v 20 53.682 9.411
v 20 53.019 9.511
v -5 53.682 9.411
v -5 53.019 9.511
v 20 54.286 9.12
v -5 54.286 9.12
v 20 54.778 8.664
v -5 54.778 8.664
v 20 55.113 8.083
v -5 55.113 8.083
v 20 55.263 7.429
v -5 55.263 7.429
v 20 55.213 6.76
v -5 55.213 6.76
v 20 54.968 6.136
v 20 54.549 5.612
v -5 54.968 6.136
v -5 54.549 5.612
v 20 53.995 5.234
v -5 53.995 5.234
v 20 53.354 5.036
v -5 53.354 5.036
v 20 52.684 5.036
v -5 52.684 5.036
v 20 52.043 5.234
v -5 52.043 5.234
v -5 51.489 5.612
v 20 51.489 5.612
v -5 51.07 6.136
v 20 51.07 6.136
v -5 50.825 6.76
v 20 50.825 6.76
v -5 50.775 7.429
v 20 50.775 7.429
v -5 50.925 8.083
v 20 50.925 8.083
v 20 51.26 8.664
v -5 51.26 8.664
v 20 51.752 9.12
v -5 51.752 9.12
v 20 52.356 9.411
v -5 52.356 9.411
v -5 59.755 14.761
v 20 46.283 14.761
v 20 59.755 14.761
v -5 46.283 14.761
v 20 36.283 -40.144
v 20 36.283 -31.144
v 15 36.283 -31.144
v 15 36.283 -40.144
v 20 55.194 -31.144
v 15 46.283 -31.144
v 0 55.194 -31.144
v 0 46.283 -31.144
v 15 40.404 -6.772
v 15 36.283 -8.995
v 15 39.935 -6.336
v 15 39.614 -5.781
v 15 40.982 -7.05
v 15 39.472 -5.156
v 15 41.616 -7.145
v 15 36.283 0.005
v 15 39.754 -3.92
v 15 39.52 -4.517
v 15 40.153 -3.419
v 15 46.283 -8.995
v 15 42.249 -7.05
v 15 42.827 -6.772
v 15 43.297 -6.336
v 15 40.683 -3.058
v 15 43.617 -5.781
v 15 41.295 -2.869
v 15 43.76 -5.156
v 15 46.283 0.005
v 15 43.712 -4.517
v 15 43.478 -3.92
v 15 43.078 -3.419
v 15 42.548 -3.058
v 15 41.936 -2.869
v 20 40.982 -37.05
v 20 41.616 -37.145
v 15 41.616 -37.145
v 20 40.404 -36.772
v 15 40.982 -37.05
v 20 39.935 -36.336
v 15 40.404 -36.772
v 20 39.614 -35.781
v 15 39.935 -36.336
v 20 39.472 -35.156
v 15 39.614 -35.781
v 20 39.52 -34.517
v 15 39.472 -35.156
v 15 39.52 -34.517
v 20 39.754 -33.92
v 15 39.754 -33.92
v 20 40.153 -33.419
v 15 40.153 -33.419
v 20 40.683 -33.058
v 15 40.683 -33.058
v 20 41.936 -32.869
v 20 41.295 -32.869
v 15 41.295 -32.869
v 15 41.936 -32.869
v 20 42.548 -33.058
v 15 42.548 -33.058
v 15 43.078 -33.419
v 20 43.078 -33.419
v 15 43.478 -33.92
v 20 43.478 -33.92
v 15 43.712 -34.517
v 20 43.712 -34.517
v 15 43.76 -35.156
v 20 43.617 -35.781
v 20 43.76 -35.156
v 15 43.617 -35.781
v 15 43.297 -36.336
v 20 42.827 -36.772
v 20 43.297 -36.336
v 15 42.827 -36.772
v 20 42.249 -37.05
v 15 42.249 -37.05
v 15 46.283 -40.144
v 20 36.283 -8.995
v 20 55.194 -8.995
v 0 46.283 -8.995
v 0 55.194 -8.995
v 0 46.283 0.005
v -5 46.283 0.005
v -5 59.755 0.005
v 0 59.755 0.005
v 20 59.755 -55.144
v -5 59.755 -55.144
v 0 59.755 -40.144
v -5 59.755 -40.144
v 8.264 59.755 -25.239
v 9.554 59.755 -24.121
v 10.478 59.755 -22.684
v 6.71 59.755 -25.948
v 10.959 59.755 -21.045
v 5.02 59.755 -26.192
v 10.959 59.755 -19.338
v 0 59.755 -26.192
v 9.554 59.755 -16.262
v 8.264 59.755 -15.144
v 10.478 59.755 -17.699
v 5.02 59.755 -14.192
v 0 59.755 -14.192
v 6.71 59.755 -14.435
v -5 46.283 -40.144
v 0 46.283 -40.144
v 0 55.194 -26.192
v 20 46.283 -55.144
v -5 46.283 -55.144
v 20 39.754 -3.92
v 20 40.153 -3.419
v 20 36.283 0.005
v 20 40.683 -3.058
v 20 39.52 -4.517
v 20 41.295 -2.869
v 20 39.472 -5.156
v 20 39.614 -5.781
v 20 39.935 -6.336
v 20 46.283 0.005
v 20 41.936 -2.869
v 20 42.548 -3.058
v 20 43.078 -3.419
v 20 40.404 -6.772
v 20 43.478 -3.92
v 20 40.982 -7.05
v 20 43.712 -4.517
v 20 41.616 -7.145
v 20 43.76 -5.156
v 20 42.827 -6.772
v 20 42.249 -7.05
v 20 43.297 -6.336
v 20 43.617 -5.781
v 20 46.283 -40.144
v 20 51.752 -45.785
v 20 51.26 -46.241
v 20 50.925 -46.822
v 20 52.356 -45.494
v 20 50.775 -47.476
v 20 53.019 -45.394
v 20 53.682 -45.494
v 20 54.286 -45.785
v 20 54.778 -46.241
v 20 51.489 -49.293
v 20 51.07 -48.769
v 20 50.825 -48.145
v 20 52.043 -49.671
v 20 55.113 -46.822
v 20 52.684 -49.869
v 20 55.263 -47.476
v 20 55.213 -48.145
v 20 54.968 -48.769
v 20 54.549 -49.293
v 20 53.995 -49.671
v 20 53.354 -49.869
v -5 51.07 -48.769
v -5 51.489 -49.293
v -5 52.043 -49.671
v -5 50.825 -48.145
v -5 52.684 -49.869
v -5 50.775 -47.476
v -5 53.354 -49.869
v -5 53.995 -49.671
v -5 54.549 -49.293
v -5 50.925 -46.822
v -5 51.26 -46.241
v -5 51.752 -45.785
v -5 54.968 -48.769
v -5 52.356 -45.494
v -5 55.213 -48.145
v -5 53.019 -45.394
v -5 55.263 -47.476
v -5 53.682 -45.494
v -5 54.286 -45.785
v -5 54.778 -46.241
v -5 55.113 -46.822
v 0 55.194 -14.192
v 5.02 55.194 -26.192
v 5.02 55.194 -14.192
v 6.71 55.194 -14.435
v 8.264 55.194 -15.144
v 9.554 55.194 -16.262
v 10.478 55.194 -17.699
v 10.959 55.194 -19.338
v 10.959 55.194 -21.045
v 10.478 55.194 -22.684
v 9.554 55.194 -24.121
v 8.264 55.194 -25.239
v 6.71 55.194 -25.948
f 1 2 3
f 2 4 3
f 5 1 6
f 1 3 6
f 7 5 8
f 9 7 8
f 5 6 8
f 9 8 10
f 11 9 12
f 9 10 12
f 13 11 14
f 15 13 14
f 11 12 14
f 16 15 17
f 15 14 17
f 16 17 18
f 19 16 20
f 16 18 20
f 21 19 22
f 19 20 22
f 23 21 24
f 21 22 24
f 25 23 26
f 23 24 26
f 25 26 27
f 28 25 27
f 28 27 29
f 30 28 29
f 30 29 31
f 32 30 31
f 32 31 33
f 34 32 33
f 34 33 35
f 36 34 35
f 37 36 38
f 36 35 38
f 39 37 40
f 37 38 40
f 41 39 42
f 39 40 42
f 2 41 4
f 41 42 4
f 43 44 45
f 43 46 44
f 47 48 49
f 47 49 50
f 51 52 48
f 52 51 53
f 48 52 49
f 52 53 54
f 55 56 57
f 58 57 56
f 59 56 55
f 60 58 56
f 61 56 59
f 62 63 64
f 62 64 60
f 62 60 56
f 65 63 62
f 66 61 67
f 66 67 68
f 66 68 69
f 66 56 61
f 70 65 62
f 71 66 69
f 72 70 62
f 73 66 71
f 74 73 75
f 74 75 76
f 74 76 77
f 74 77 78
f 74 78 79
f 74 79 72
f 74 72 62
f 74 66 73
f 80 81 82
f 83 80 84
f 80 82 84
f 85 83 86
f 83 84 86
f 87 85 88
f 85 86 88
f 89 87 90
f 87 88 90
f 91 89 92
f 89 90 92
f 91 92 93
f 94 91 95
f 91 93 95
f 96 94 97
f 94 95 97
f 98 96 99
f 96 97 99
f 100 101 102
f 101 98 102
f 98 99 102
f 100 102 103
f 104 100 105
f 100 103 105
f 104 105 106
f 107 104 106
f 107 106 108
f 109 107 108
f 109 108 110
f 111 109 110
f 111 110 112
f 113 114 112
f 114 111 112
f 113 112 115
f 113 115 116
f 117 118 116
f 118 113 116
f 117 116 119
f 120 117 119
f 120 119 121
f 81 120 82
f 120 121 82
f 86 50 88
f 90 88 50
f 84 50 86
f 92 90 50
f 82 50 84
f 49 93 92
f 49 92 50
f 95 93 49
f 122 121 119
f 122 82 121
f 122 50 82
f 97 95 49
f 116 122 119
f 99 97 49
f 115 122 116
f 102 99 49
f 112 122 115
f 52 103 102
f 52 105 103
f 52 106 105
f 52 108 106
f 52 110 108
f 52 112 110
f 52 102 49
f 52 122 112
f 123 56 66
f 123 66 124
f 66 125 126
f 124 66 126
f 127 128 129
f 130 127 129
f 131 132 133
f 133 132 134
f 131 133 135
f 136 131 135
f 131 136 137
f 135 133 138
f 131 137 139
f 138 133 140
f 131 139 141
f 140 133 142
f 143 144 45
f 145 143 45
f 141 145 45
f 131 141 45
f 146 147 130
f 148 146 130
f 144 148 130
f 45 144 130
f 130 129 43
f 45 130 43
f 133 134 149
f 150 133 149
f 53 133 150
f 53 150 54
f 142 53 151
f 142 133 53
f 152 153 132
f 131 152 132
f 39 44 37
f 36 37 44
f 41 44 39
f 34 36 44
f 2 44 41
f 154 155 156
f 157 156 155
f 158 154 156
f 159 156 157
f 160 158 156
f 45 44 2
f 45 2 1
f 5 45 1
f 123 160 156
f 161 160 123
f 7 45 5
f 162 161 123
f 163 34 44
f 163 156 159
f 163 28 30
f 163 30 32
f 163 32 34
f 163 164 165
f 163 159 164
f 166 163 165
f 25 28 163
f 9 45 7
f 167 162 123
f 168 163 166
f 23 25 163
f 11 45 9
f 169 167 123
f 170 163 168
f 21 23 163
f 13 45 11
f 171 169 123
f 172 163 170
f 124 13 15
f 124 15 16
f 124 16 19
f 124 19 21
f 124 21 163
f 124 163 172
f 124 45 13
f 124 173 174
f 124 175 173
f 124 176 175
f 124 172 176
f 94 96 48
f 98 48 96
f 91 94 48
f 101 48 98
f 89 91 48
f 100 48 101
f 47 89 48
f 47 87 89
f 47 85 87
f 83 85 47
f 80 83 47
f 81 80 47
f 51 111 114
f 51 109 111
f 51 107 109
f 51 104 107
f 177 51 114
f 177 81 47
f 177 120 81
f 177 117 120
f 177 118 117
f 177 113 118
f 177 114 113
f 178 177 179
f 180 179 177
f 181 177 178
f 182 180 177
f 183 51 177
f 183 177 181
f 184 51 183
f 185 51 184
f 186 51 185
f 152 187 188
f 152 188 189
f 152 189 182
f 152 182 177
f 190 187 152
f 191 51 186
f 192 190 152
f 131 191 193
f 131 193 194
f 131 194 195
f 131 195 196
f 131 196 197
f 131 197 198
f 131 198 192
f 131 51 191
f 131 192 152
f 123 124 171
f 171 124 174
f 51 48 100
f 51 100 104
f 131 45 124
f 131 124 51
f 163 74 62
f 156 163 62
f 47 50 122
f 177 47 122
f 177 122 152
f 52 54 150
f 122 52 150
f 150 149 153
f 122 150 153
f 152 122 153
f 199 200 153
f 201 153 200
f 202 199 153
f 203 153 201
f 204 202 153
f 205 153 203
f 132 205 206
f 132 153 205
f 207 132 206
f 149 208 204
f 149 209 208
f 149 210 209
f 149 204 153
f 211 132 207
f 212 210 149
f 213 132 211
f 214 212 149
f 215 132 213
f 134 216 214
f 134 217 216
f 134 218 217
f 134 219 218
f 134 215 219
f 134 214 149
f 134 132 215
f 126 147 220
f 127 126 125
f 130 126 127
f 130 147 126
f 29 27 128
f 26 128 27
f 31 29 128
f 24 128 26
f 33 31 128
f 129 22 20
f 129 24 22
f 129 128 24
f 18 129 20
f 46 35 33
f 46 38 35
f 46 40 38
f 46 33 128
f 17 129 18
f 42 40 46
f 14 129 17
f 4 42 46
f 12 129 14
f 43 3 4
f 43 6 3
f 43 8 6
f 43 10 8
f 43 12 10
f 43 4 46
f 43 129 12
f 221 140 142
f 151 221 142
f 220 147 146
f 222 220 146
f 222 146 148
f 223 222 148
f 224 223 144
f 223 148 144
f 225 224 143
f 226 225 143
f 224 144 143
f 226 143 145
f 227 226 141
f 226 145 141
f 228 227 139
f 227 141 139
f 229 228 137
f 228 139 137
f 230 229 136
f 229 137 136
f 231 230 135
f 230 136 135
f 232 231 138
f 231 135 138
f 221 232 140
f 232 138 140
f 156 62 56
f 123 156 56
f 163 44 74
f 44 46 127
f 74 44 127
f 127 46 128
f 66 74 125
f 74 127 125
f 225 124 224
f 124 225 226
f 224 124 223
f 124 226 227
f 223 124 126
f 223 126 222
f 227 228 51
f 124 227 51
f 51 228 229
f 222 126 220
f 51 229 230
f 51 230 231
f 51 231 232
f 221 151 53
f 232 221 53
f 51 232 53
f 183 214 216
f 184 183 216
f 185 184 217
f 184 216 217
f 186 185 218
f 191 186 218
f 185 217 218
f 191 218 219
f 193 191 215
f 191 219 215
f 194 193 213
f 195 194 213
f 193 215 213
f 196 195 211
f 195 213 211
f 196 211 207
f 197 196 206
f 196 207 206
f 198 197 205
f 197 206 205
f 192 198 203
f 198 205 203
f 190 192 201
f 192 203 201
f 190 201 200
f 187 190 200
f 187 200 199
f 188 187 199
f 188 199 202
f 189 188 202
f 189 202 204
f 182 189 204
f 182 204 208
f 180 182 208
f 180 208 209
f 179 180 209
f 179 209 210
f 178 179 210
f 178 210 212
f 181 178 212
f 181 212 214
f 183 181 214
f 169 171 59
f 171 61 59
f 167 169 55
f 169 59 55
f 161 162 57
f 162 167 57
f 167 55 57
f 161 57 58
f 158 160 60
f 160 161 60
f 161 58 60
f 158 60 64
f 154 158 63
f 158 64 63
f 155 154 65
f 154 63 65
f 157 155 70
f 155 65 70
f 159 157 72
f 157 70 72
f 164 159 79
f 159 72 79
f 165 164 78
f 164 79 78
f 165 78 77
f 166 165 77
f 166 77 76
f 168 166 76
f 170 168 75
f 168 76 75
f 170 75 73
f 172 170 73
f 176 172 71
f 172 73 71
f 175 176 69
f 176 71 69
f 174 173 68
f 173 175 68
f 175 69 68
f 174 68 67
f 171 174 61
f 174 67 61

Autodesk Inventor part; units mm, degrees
ref_plane "YZ Plane" through (0, 0, 0) normal (1, 0, 0) x (0, 1, 0)
ref_plane "XZ Plane" through (0, 0, 0) normal (0, 1, 0) x (-1, 0, 0)
ref_plane "XY Plane" through (0, 0, 0) normal (0, 0, 1) x (1, 0, 0)
sketch "Esquisse1" plane through (0, 0, 0) normal (1, 0, 0) x (0, 1, 0)
  line L0 (-54.8063, -40.1439) -> (54.7548, -40.1439)
  line L1 (54.7548, 0.0046) -> (-54.8063, 0.0046)
  line L2 (41.6156, -39.9954) -> (41.6156, -34.9954) construction
  line L3 (41.6156, -34.9954) -> (-43.4679, -34.9954) construction
  circle A0 centre (41.6156, -34.9954) radius 2.15
  circle A1 centre (1.6156, -34.9954) radius 2.15
  circle A2 centre (-38.3844, -34.9954) radius 2.15
  circle A3 centre (41.6156, -4.9954) radius 2.15
  circle A4 centre (1.6156, -4.9954) radius 2.15
  circle A5 centre (-38.3844, -4.9954) radius 2.15
  line L4 (-38.3844, 0.0046) -> (-38.3844, -4.9954) construction
  line L5 (54.7548, -40.1439) -> (59.7548, -40.1439)
  line L6 (59.7548, -40.1439) -> (59.7548, 0.0046)
  line L7 (59.7548, 0.0046) -> (54.7548, 0.0046)
  line L8 (-54.8063, -31.1439) -> (55.1937, -31.1439)
  line L9 (-54.8063, -8.9954) -> (55.1937, -8.9954)
  line L10 (-54.8063, 0.0046) -> (-54.8063, -8.9954)
  line L11 (-54.8063, -31.1439) -> (-54.8063, -40.1439)
  line L12 (55.1937, -31.1439) -> (55.1937, -8.9954)
  line L13 (-54.8063, -31.1439) -> (-54.8063, -40.1439)
  line L14 (-54.8063, -40.1439) -> (59.7548, -40.1439)
  line L15 (59.7548, -40.1439) -> (59.7548, 0.0046)
  line L16 (59.7548, 0.0046) -> (-54.8063, 0.0046)
  line L17 (-54.8063, 0.0046) -> (-54.8063, -8.9954)
  line L18 (-54.8063, -8.9954) -> (55.1937, -8.9954)
  line L19 (55.1937, -8.9954) -> (55.1937, -31.1439)
  line L20 (55.1937, -31.1439) -> (-54.8063, -31.1439)
  point P0 (0, 0)
  point P1 (60.2697, -11.7227)
  dimension "d4" = 5
  dimension "d5" = 4.3
  dimension "d6" = 40
  dimension "d7" = 30
  dimension "d8" = 5
  dimension "d9" = 5
  dimension "d10" = 110
  dimension "d11" = 9
  dimension "d12" = 110
  dimension "d14" = 40.1485
  dimension "d15" = 9
extrude "Extrusion1" add sketch "Esquisse1" along normal blind 15
sketch "Esquisse4" plane through (0, 59.7548, 0.0046) normal (0, 1, 0) x (1, 0, 0)
  circle A0 centre (5.0199, 20.1961) radius 6
  circle A1 centre (5.0199, 20.1961) radius 6
  point P0 (0, 0.0046)
  dimension "d18" = 12
extrude "Extrusion2" cut sketch "Esquisse4" against normal blind 15
sketch "Esquisse5" plane through (0, -54.8063, 0.0046) normal (0, 0, 1) x (1, 0, 0)
  line L0 (15, 114.5611) -> (15, 0) construction
  line L1 (15, 114.5611) -> (11.2, 114.5611) construction
  line L2 (0, 114.5611) -> (15, 114.5611) construction
  line L3 (11.2, 114.5611) -> (11.2, 58.3541) construction
  line L4 (15, 91.0895) -> (11.2, 91.0895)
  line L5 (11.2, 91.0895) -> (11.2, 31.0895)
  line L6 (11.2, 31.0895) -> (15, 31.0895)
  line L7 (15, 31.0895) -> (15, 91.0895)
  point P0 (0, 54.8063)
  dimension "d21" = 3.8
  dimension "d22" = 60
extrude "Extrusion3" cut sketch "Esquisse5" against normal blind 15
sketch "Esquisse6" plane through (0, -54.8063, 0.0046) normal (0, 0, 1) x (1, 0, 0)
  line L0 (11.2, 91.0895) -> (11.2, 31.0895) projected
  line L1 (11.2, 91.0895) -> (-5, 91.0895)
  line L2 (-5, 91.0895) -> (-5, 31.3621)
  line L3 (-5, 31.3621) -> (11.2, 31.3621)
  line L4 (11.2, 31.3621) -> (11.2, 91.0895)
  point P0 (0, 54.8063)
  dimension "d25" = 16.2
extrude "Extrusion4" add sketch "Esquisse6" along normal blind 30
sketch "Esquisse7" plane through (11.2, -23.7168, -8.9954) normal (1, 0, 0) x (0, 0, -1)
  line L0 (0, 60) -> (0, 0) projected
  line L1 (-9, 60) -> (0, 60) projected
  line L2 (-9, 60) -> (-39, 60) projected
  line L3 (-39, 0.2726) -> (-39, 60) projected
  line L4 (-9, 0.2726) -> (-39, 0.2726) projected
  line L5 (-9, 0) -> (-9, 0.2726) projected
  line L6 (-9, 0) -> (0, 0) projected
  circle A0 centre (-4, 25.3324) radius 2.15 projected
  circle A1 centre (-10, 31.1304) radius 1
  circle A2 centre (-18, 39.1304) radius 1
  circle A3 centre (-26, 39.1304) radius 1
  circle A4 centre (-26, 31.1304) radius 1
  circle A5 centre (-26, 23.1304) radius 1
  circle A6 centre (-18, 23.1304) radius 1
  circle A7 centre (-10, 23.1304) radius 1
  circle A8 centre (-10, 39.1304) radius 1
  point P0 (-8.9954, 23.7168)
  dimension "d28" = 10
  dimension "d29" = 16
  dimension "d30" = 8
  dimension "d31" = 8
  dimension "d32" = 8
  dimension "d33" = 8
  dimension "d34" = 8
  dimension "d35" = 8
extrude "Extrusion5" cut sketch "Esquisse7" against normal blind 30 contours A1 | A2 | A3 | A4 | A5 | A6 | A7 | A8
sketch "Esquisse8" plane through (15, 0, 0) normal (1, 0, 0) x (0, 0, -1)
  line L0 (-0.0046, 36.2832) -> (8.9954, 36.2832) projected
  line L1 (8.9954, 36.2832) -> (8.9954, 55.1937) projected
  line L2 (8.9954, 55.1937) -> (31.1439, 55.1937) projected
  line L3 (31.1439, 55.1937) -> (31.1439, -54.8063) projected
  line L4 (31.1439, -54.8063) -> (40.1439, -54.8063) projected
  line L5 (40.1439, -54.8063) -> (40.1439, 59.7548) projected
  line L6 (40.1439, 59.7548) -> (-0.0046, 59.7548) projected
  line L7 (-0.0046, 59.7548) -> (-0.0046, 36.2832) projected
  circle A0 centre (4.9954, 41.6156) radius 2.15 projected
  circle A1 centre (34.9954, -38.3844) radius 2.15 projected
  circle A2 centre (34.9954, 1.6156) radius 2.15 projected
  circle A3 centre (34.9954, 41.6156) radius 2.15 projected
  point P0 (0, 0)
sketch "Esquisse10" plane through (15, 0, 0) normal (1, 0, 0) x (0, 0, -1)
  line L0 (31.0084, 36.2646) -> (31.0084, -23.7354)
  circle A0 centre (41.0084, -0.605) radius 1
  circle A1 centre (57.0084, -0.605) radius 1
  circle A2 centre (57.0084, 15.395) radius 1
  circle A3 centre (41.0084, 7.395) radius 1
  circle A4 centre (49.0084, 15.395) radius 1
  circle A5 centre (57.0084, 7.395) radius 1
  circle A6 centre (49.0084, -0.605) radius 1
  circle A7 centre (41.0084, 15.395) radius 1
  line L1 (40.0084, 36.2646) -> (31.0084, 36.2646)
  line L2 (40.0084, 36.2646) -> (70.0084, 36.2646)
  line L3 (70.0084, -23.4628) -> (70.0084, 36.2646)
  line L4 (40.0084, -23.4628) -> (70.0084, -23.4628)
  line L5 (40.0084, -23.7354) -> (40.0084, -23.4628)
  line L6 (40.0084, -23.7354) -> (31.0084, -23.7354)
  circle A8 centre (35.0084, 1.597) radius 2.15
  point P0 (0, 0)
  point P1 (40.0039, -0.0185)
extrude "Extrusion6" cut sketch "Esquisse10" against normal blind 3.8 contours L1 L2 L3 L4 L5 L6 L0 | A0 | A1 | A2 | A3 | A4 | A5 | A6 | A7 | A8
sketch "Esquisse13" plane through (11.2, 0, 0) normal (1, 0, 0) x (0, 0, -1)
  line L0 (30.9931, 36.2812) -> (30.9931, -23.7188)
  circle A0 centre (40.9931, -0.5884) radius 1
  circle A1 centre (56.9931, -0.5884) radius 1
  circle A2 centre (56.9931, 15.4116) radius 1
  circle A3 centre (40.9931, 7.4116) radius 1
  circle A4 centre (48.9931, 15.4116) radius 1
  circle A5 centre (56.9931, 7.4116) radius 1
  circle A6 centre (48.9931, -0.5884) radius 1
  circle A7 centre (40.9931, 15.4116) radius 1
  line L1 (39.9931, 36.2812) -> (30.9931, 36.2812)
  line L2 (39.9931, 36.2812) -> (69.9931, 36.2812)
  line L3 (69.9931, -23.4462) -> (69.9931, 36.2812)
  line L4 (39.9931, -23.4462) -> (69.9931, -23.4462)
  line L5 (39.9931, -23.7188) -> (39.9931, -23.4462)
  line L6 (39.9931, -23.7188) -> (30.9931, -23.7188)
  circle A8 centre (34.9931, 1.6136) radius 2.15
  point P0 (0, 0)
  point P1 (39.9885, -0.002)
extrude "Extrusion7" add sketch "Esquisse13" against normal blind 16.2
sketch "Esquisse14" plane through (-5, 0, 0) normal (-1, 0, 0) x (0, 0, 1)
  circle A0 centre (-56.9931, -0.5884) radius 1 projected
  circle A1 centre (-56.9931, 7.4116) radius 1 projected
  circle A2 centre (-56.9931, 15.4116) radius 1 projected
  circle A3 centre (-48.9931, 15.4116) radius 1 projected
  circle A4 centre (-48.9931, -0.5884) radius 1 projected
  circle A5 centre (-40.9931, -0.5884) radius 1 projected
  circle A6 centre (-40.9931, 7.4116) radius 1 projected
  circle A7 centre (-40.9931, 15.4116) radius 1 projected
  circle A8 centre (-56.9931, -0.5884) radius 1 projected
  circle A9 centre (-56.9931, -0.5884) radius 3
  line L0 (-56.9931, -0.5884) -> (-56.9931, 15.4116) construction
  line L1 (-56.9931, 15.4116) -> (-40.9931, 15.4116) construction
  circle A10 centre (-56.9931, 7.4116) radius 3
  circle A11 centre (-56.9931, 15.4116) radius 3
  circle A12 centre (-48.9931, -0.5884) radius 3
  circle A13 centre (-48.9931, 7.4116) radius 3
  circle A14 centre (-48.9931, 15.4116) radius 3
  circle A15 centre (-40.9931, -0.5884) radius 3
  circle A16 centre (-40.9931, 7.4116) radius 3
  circle A17 centre (-40.9931, 15.4116) radius 3
  line L2 (-26.1915, 59.7548) -> (-14.1915, 59.7548) construction
  line L3 (-20.1915, 59.7548) -> (-20.1915, -51.3949) construction
  circle A18 centre (16.6101, -0.5884) radius 1
  circle A19 centre (16.6101, 7.4116) radius 1
  circle A20 centre (16.6101, 15.4116) radius 1
  circle A21 centre (8.6101, 15.4116) radius 1
  circle A22 centre (8.6101, -0.5884) radius 1
  circle A23 centre (0.6101, -0.5884) radius 1
  circle A24 centre (0.6101, 7.4116) radius 1
  circle A25 centre (0.6101, 15.4116) radius 1
  circle A26 centre (16.6101, -0.5884) radius 1
  circle A27 centre (16.6101, -0.5884) radius 3
  line L4 (16.6101, -0.5884) -> (16.6101, 15.4116) construction
  line L5 (16.6101, 15.4116) -> (0.6101, 15.4116) construction
  circle A28 centre (16.6101, 7.4116) radius 3
  circle A29 centre (16.6101, 15.4116) radius 3
  circle A30 centre (8.6101, -0.5884) radius 3
  circle A31 centre (8.6101, 7.4116) radius 3
  circle A32 centre (8.6101, 15.4116) radius 3
  circle A33 centre (0.6101, -0.5884) radius 3
  circle A34 centre (0.6101, 7.4116) radius 3
  circle A35 centre (0.6101, 15.4116) radius 3
  point P0 (0, 0)
  point P1 (-23.478, 59.7548)
  point P2 (-16.9051, 59.7548)
  dimension "d44" = 6
  dimension "d47" = 8
  dimension "d50" = 8
extrude "Extrusion8" cut sketch "Esquisse14" against normal blind 8 contours A0 | A1 | A2 | A3 | A4 | A5 | A6 | A7 | A9 | A10 | A11 | A12 | A14 | A15 | A16 | A17 | A18 | A19 | A20 | A21 | A22 | A23 | A24 | A25 | A27 | A28 | A29 | A30 | A32 | A33 | A34 | A35
sketch "Esquisse15" plane through (-5, 0, 0) normal (-1, 0, 0) x (0, 0, 1)
  line L0 (-39.9931, -23.7188) -> (-30.9931, -23.7188) projected
  line L1 (-40.1439, 36.2646) -> (-40.1439, 59.7548) projected
  line L2 (-30.9931, -23.7188) -> (-40.1439, -23.7188)
  line L3 (-40.1439, -23.7188) -> (-40.1439, 36.2646)
  line L4 (-40.1439, 36.2646) -> (-30.9931, 36.2646)
  line L5 (-30.9931, 36.2646) -> (-30.9931, -23.7188)
  line L6 (-40.1439, 36.2646) -> (-30.9931, 36.2646)
  line L7 (-30.9931, 36.2646) -> (-30.9931, 36.6984)
  line L8 (-30.9931, 36.6984) -> (-40.1439, 36.6984)
  line L9 (-40.1439, 36.6984) -> (-40.1439, 36.2646)
  point P0 (0, 0)
extrude "Extrusion9" cut sketch "Esquisse15" against normal blind 5
sketch "Esquisse16" plane through (11.2, -23.7188, -30.9931) normal (0, 0, 1) x (1, 0, 0)
  line L0 (-11.2, 60) -> (-11.2, 0) projected
  line L1 (0, 0) -> (-11.2, 0) projected
  line L2 (0, 0) -> (0, 60) projected
  line L3 (0, 60) -> (-11.2, 60) projected
  point P0 (-11.2, 23.7188)
extrude "Extrusion10" cut sketch "Esquisse16" against normal blind 0.15
sketch "Esquisse17" plane through (11.2, 0, 0) normal (1, 0, 0) x (0, 0, -1)
  line L0 (31.1431, 36.2812) -> (31.1431, -23.7188) projected
  line L1 (31.1439, -23.7188) -> (31.1431, -23.7188) projected
  line L2 (31.1439, -23.7354) -> (31.1439, -23.7188) projected
  line L3 (40.0084, -23.7354) -> (31.1439, -23.7354) projected
  line L4 (40.0084, -23.4628) -> (40.0084, -23.7354) projected
  line L5 (40.1439, -23.4628) -> (40.0084, -23.4628) projected
  line L6 (40.1439, -23.4462) -> (40.1439, -23.4628) projected
  line L7 (69.9931, -23.4462) -> (40.1439, -23.4462) projected
  line L8 (69.9931, 36.2812) -> (69.9931, -23.4462) projected
  line L9 (40.1439, 36.2812) -> (69.9931, 36.2812) projected
  line L10 (40.1439, 36.2646) -> (40.1439, 36.2812) projected
  line L11 (31.1439, 36.2646) -> (40.1439, 36.2646) projected
  line L12 (31.1439, 36.2812) -> (31.1439, 36.2646) projected
  line L13 (31.1431, 36.2812) -> (31.1439, 36.2812) projected
  line L14 (40.1439, -0.0603) -> (40.1439, -1.1165) projected
  arc A0 (40.1439, -1.1165) -> (40.1439, -0.0603) centre (40.9931, -0.5884) ccw projected
  line L15 (40.1439, 7.9397) -> (40.1439, 6.8835) projected
  arc A1 (40.1439, 6.8835) -> (40.1439, 7.9397) centre (40.9931, 7.4116) ccw projected
  line L16 (40.1439, 15.9397) -> (40.1439, 14.8835) projected
  arc A2 (40.1439, 14.8835) -> (40.1439, 15.9397) centre (40.9931, 15.4116) ccw projected
  circle A3 centre (48.9931, -0.5884) radius 1 projected
  circle A4 centre (56.9931, -0.5884) radius 1 projected
  circle A5 centre (56.9931, 7.4116) radius 1 projected
  circle A6 centre (48.9931, 15.4116) radius 1 projected
  circle A7 centre (56.9931, 15.4116) radius 1 projected
  arc A8 (33.6113, 3.2608) -> (36.3772, -0.0316) centre (34.9954, 1.6156) ccw projected
  arc A9 (36.3772, -0.0316) -> (33.6113, 3.2608) centre (34.9931, 1.6136) ccw projected
  line L17 (69.9931, -23.4462) -> (40.1439, -23.4462) projected
  line L18 (59.9931, -23.4462) -> (59.9931, 36.2812)
  line L19 (40.1439, 36.2812) -> (69.9931, 36.2812) projected
  line L20 (26.1915, 55.1937) -> (14.1915, 55.1937) construction
  line L21 (20.1915, 55.1937) -> (20.1915, -54.679) construction
  line L22 (-19.6101, -23.4462) -> (-19.6101, 36.2812)
  circle A10 centre (-1.0046, -0.5864) radius 1 projected
  circle A11 centre (-17.0046, -0.5864) radius 1 projected
  circle A12 centre (-17.0046, 15.4136) radius 1 projected
  circle A13 centre (-1.0046, 7.4136) radius 1 projected
  circle A14 centre (-9.0046, 15.4136) radius 1 projected
  circle A15 centre (-17.0046, 7.4136) radius 1 projected
  circle A16 centre (-9.0046, -0.5864) radius 1 projected
  circle A17 centre (-1.0046, 15.4136) radius 1 projected
  line L23 (8.9954, 36.2832) -> (8.9954, -23.7168) projected
  line L24 (-0.0046, 36.2832) -> (8.9954, 36.2832) projected
  line L25 (-0.0046, 36.2832) -> (-30.0046, 36.2832) projected
  line L26 (-30.0046, -23.4442) -> (-30.0046, 36.2832) projected
  line L27 (-0.0046, -23.4442) -> (-30.0046, -23.4442) projected
  line L28 (-0.0046, -23.7168) -> (-0.0046, -23.4442) projected
  line L29 (-0.0046, -23.7168) -> (8.9954, -23.7168) projected
  circle A18 centre (4.9954, 1.6156) radius 2.15 projected
  line L30 (-19.6101, -23.4462) -> (-19.6101, 36.2812)
  line L31 (-0.0046, 36.2832) -> (-30.0046, 36.2832) projected
  point P0 (0, 0)
  point P1 (16.9051, 55.1937)
  point P2 (23.478, 55.1937)
  dimension "d59" = 10
extrude "Extrusion11" cut sketch "Esquisse17" against normal blind 52.35 contours L9 L8 L7 L18
sketch "Esquisse18" plane through (11.2, -23.7168, -8.9954) normal (1, 0, 0) x (0, 0, -1)
  circle A0 centre (-10, 23.1304) radius 1 projected
  circle A1 centre (-26, 23.1304) radius 1 projected
  circle A2 centre (-26, 39.1304) radius 1 projected
  circle A3 centre (-10, 31.1304) radius 1 projected
  circle A4 centre (-18, 39.1304) radius 1 projected
  circle A5 centre (-26, 31.1304) radius 1 projected
  circle A6 centre (-18, 23.1304) radius 1 projected
  circle A7 centre (-10, 39.1304) radius 1 projected
  line L0 (0, 60) -> (0, 0) projected
  line L1 (-9, 60) -> (0, 60) projected
  line L2 (-9, 60) -> (-39, 60) projected
  line L3 (-39, 0.2726) -> (-39, 60) projected
  line L4 (-9, 0.2726) -> (-39, 0.2726) projected
  line L5 (-9, 0) -> (-9, 0.2726) projected
  line L6 (-9, 0) -> (0, 0) projected
  circle A8 centre (-4, 25.3324) radius 2.15 projected
  line L7 (-9, 0.2726) -> (-39, 0.2726) projected
  line L8 (-29, 0.2726) -> (-29, 60)
  line L9 (-9, 60) -> (-39, 60) projected
  line L10 (-39, 0.2726) -> (-39, 60) projected
  line L11 (-29, 0.2726) -> (-39, 0.2726)
  line L12 (-39, 0.2726) -> (-39, 60)
  line L13 (-39, 60) -> (-29, 60)
  line L14 (-29, 60) -> (-29, 0.2726)
  point P0 (-8.9954, 23.7168)
  dimension "d62" = 10
extrude "Extrusion12" cut sketch "Esquisse18" against normal blind 41.15 contours L8 L4 L3 L2
extrude "Extrusion13" add sketch "Esquisse8" along normal blind 5
sketch "Esquisse21" plane through (20, 0, 0) normal (1, 0, 0) x (0, 0, -1)
  line L0 (-0.0046, 36.2832) -> (-20.0046, 36.2832) projected
  line L1 (-20.0046, 36.2832) -> (60.2403, 36.2832)
  line L2 (60.2403, 36.2832) -> (60.2403, -56.4108)
  line L3 (60.2403, -56.4108) -> (-20.0046, -56.4108)
  line L4 (-20.0046, -56.4108) -> (-20.0046, 36.2832)
  point P0 (0, 0)
extrude "Extrusion14" cut sketch "Esquisse21" against normal blind 51
sketch "Esquisse22" plane through (0, 0, 0) normal (-1, 0, 0) x (0, 0, 1)
  line L0 (-40.1439, 36.2832) -> (-40.1439, 59.7548) projected
  line L1 (-31.1439, 55.1937) -> (-31.1439, 36.2832) projected
  line L2 (-40.1439, 36.2832) -> (-31.1439, 36.2832)
  line L3 (-31.1439, 36.2832) -> (-31.1439, 46.2832)
  line L4 (-31.1439, 46.2832) -> (-40.1439, 46.2832)
  line L5 (-40.1439, 46.2832) -> (-40.1439, 36.2832)
  line L6 (-8.9954, 36.2832) -> (-8.9954, 55.1937) projected
  line L7 (-8.9954, 36.2832) -> (0.3861, 36.2832)
  line L8 (0.3861, 36.2832) -> (0.3861, 46.2832)
  line L9 (0.3861, 46.2832) -> (-8.9954, 46.2832)
  line L10 (-8.9954, 46.2832) -> (-8.9954, 36.2832)
  point P0 (0, 0)
  dimension "d69" = 10
extrude "Extrusion15" cut sketch "Esquisse22" against normal blind 15
sketch "Esquisse23" plane through (0, 59.7548, 0.0046) normal (0, 1, 0) x (1, 0, 0)
  arc A0 (0, 16.9096) -> (0, 23.4825) centre (5.0199, 20.1961) ccw projected
  line L0 (5.0199, 26.1961) -> (5.0199, 14.1961)
  line L1 (5.0199, 26.1961) -> (0, 26.1961)
  line L2 (0, 26.1961) -> (0, 14.1961)
  line L3 (0, 14.1961) -> (5.0199, 14.1961)
  line L4 (5.0199, 14.1961) -> (5.0199, 26.1961)
  point P0 (0, 0.0046)
extrude "Extrusion16" cut sketch "Esquisse23" against normal blind 15 contours L2 A0 L0 | A0 L3 L2 | L2 L1 A0
sketch "Esquisse24" plane through (0, 0, 0) normal (-1, 0, 0) x (0, 0, 1)
  line L0 (-26.1915, 55.1937) -> (-26.1915, 59.7548) projected
  line L1 (-40.1439, 59.7548) -> (-26.1915, 59.7548) projected
  line L2 (-40.1439, 46.2832) -> (-40.1439, 59.7548) projected
  line L3 (-40.1439, 46.2832) -> (-31.1439, 46.2832) projected
  line L4 (-31.1439, 55.1937) -> (-31.1439, 46.2832) projected
  line L5 (-26.1915, 55.1937) -> (-31.1439, 55.1937) projected
  line L6 (-14.1915, 59.7548) -> (-14.1915, 55.1937) projected
  line L7 (-8.9954, 55.1937) -> (-14.1915, 55.1937) projected
  line L8 (-8.9954, 46.2832) -> (-8.9954, 55.1937) projected
  line L9 (-8.9954, 46.2832) -> (0.0046, 46.2832) projected
  line L10 (0.0046, 59.7548) -> (0.0046, 46.2832) projected
  line L11 (-14.1915, 59.7548) -> (0.0046, 59.7548) projected
  point P0 (0, 0)
extrude "Extrusion17" add sketch "Esquisse24" along normal blind 5
sketch "Esquisse26" plane through (-5, 0, 0) normal (-1, 0, 0) x (0, 0, 1)
  line L0 (-26.1915, 59.7548) -> (-14.1915, 59.7548) construction
  line L1 (-20.1915, 59.7548) -> (-20.1915, -3.4789) construction
  line L2 (-40.1439, 36.2832) -> (-40.1439, 59.7548) projected
  line L3 (-40.1439, 59.7548) -> (-55.1439, 59.7548)
  line L4 (-40.1439, 46.2832) -> (-31.1439, 46.2832) construction
  line L5 (-40.1439, 46.2832) -> (-55.1439, 46.2832)
  line L6 (-55.1439, 46.2832) -> (-55.1439, 59.7548)
  line L7 (-40.1439, 36.2832) -> (-40.1439, 46.2832) construction
  line L8 (-40.1439, 59.7548) -> (-40.1439, 46.2832) construction
  circle A0 centre (-47.6439, 53.019) radius 2.25
  line L9 (-0.2391, 36.2832) -> (-0.2391, 59.7548)
  line L10 (-0.2391, 59.7548) -> (14.7609, 59.7548)
  line L11 (-0.2391, 46.2832) -> (-9.2391, 46.2832) construction
  line L12 (-0.2391, 46.2832) -> (14.7609, 46.2832)
  line L13 (14.7609, 46.2832) -> (14.7609, 59.7548)
  line L14 (-0.2391, 36.2832) -> (-0.2391, 46.2832) construction
  line L15 (-0.2391, 59.7548) -> (-0.2391, 46.2832) construction
  circle A1 centre (7.2609, 53.019) radius 2.25
  point P0 (0, 0)
  dimension "d76" = 15
  dimension "d77" = 4.5
extrude "Extrusion18" add sketch "Esquisse26" against normal up to surface (25 mm away)
sketch "Esquisse28" plane through (-5, 0, 0) normal (-1, 0, 0) x (0, 0, 1)
  line L0 (-40.1439, 36.2832) -> (-40.1439, 46.2832) construction
  line L1 (-8.9954, 46.2832) -> (0.0046, 46.2832) construction
  line L2 (-40.1439, 46.2832) -> (0.0046, 46.2832) construction
  line L3 (-40.1439, 46.2832) -> (-31.1439, 46.2832) projected
  line L4 (14.7609, 59.7548) -> (-55.1439, 59.7548) projected
  line L5 (-40.1439, 46.2832) -> (0.0046, 46.2832)
  line L6 (0.0046, 46.2832) -> (0.0046, 59.7548)
  line L7 (0.0046, 59.7548) -> (-40.1439, 59.7548)
  line L8 (-40.1439, 59.7548) -> (-40.1439, 46.2832)
  point P0 (0, 0)
extrude "Extrusion19" cut sketch "Esquisse28" against normal blind 5
properties part number "aret"
